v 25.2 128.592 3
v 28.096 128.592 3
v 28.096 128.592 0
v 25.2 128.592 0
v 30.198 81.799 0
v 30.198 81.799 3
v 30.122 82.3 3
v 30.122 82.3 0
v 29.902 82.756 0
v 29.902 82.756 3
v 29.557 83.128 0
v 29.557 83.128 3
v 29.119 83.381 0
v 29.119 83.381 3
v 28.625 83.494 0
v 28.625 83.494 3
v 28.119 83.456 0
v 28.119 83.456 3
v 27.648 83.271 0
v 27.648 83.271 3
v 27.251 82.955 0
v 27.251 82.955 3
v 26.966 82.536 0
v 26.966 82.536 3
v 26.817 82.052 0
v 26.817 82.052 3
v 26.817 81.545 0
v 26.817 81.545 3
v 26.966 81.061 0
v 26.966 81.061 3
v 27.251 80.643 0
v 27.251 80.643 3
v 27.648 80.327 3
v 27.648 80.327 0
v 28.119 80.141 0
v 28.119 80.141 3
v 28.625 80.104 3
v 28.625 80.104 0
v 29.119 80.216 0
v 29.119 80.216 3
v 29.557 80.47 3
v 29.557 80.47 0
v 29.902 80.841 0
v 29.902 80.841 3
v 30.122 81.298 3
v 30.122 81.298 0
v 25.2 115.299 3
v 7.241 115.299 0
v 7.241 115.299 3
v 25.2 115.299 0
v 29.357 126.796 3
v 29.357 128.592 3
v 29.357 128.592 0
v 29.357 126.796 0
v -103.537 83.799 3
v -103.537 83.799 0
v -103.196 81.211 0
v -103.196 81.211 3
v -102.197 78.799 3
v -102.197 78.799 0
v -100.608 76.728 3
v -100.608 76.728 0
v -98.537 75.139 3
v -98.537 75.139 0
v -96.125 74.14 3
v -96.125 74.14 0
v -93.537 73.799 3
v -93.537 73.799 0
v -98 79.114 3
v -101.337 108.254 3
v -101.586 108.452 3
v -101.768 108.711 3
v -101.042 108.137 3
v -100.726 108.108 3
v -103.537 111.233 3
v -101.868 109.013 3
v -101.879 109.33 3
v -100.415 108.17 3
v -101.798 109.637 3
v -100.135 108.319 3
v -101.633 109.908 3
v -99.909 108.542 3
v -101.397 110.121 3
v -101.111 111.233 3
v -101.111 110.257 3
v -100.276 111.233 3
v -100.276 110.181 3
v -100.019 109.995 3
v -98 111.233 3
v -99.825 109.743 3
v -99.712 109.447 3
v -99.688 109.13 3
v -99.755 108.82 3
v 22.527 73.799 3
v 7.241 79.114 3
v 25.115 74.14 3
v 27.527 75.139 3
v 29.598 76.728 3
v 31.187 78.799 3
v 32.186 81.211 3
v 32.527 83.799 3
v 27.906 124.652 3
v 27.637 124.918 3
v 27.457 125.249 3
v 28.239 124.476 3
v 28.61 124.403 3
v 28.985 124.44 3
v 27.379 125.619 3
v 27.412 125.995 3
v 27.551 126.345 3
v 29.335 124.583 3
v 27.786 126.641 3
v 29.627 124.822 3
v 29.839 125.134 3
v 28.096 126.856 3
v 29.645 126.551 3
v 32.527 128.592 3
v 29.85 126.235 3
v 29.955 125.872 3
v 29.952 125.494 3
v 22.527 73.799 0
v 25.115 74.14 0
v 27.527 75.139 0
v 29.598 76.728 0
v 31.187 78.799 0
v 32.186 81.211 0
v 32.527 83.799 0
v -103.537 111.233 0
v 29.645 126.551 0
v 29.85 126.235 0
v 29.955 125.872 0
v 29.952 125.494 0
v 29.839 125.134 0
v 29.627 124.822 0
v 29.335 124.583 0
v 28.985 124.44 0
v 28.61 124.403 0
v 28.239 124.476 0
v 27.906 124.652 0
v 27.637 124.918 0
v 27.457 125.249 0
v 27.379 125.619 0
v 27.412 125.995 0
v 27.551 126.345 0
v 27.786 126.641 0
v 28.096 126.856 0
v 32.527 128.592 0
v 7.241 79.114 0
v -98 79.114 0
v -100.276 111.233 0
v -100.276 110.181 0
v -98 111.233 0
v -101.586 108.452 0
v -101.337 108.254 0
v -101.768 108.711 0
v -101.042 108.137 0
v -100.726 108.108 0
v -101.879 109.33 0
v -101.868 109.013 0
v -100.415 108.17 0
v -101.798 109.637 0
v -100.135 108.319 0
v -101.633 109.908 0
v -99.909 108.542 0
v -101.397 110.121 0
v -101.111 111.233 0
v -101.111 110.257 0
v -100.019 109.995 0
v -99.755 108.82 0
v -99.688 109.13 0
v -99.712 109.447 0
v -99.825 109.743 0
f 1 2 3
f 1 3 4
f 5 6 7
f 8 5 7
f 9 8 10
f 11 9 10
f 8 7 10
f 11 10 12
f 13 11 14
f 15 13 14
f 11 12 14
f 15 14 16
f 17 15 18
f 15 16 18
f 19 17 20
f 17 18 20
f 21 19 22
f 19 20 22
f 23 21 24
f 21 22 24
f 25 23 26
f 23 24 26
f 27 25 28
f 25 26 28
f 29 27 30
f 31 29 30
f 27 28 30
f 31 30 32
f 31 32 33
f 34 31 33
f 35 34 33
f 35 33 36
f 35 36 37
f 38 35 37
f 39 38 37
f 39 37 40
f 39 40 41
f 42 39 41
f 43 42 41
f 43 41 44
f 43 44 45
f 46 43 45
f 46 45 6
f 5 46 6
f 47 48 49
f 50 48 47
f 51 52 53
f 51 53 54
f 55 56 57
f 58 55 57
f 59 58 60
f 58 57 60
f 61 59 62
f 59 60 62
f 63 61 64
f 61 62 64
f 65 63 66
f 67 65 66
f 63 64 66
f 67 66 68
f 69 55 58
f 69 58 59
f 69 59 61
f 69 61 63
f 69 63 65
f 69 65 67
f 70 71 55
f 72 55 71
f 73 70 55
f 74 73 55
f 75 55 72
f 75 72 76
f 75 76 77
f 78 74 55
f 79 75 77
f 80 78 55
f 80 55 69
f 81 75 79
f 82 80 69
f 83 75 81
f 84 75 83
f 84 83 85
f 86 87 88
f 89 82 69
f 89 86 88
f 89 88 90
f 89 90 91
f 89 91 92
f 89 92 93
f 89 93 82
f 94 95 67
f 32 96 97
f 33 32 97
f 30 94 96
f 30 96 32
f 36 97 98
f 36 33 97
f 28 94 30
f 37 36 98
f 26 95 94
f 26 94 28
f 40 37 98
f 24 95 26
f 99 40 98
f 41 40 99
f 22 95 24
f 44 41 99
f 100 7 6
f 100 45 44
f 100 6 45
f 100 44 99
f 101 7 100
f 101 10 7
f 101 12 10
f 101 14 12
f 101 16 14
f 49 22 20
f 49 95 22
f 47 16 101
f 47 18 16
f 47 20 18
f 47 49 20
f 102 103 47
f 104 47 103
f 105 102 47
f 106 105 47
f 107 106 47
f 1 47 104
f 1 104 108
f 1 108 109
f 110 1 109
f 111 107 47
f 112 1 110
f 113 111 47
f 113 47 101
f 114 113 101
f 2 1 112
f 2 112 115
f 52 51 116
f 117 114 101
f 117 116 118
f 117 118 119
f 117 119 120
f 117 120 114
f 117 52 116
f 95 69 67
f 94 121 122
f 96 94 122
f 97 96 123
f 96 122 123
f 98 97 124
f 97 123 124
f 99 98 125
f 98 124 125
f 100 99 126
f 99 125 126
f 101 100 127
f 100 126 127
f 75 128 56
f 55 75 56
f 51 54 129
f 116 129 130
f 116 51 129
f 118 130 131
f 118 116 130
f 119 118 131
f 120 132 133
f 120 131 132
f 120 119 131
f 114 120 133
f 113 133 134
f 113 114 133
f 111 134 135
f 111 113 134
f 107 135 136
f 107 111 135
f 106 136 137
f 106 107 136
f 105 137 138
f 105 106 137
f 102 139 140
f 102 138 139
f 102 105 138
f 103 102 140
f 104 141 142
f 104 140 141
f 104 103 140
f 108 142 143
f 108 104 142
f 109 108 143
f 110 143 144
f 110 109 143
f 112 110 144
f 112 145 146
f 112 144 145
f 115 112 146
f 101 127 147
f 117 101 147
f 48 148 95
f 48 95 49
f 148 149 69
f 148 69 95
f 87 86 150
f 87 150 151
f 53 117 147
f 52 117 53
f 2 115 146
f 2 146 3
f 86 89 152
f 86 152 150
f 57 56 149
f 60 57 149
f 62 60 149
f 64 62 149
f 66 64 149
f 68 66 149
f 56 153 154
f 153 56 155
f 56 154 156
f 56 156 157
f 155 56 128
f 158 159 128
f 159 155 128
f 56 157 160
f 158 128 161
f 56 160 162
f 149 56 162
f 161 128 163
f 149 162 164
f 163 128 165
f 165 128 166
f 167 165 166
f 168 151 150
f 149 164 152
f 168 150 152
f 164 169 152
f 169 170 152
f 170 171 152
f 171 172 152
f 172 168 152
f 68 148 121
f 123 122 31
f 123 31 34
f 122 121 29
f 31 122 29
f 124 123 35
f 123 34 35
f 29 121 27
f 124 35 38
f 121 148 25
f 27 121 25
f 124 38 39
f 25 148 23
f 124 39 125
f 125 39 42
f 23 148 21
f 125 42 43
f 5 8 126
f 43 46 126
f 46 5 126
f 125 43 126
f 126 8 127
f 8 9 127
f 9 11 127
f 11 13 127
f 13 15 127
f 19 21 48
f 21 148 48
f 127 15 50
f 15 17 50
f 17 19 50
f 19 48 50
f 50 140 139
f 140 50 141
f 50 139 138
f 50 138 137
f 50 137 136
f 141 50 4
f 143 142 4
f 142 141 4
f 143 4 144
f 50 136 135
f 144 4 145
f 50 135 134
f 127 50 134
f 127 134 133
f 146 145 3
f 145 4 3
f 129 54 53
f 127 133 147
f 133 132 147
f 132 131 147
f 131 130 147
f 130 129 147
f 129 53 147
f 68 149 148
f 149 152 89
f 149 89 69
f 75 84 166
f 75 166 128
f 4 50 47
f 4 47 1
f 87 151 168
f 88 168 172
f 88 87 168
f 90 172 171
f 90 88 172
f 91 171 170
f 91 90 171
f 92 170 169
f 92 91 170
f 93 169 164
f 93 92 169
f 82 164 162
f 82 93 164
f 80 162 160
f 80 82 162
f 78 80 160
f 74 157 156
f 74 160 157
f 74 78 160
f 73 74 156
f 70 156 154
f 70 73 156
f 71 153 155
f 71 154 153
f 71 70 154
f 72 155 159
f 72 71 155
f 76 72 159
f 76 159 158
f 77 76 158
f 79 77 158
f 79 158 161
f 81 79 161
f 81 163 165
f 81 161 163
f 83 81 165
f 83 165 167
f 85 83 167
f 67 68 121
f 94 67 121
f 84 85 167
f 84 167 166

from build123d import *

# Parameters (mm, degrees)
BOSS_EXTRUDE1_DEPTH  = 3
M3_CLEARANCE_HOLE1_D = 3.4
CUT_EXTRUDE1_DEPTH   = 10


with BuildPart() as part:
    # Sketch1 → Boss-Extrude1 (new body)
    with BuildSketch(Plane.XY):
        with BuildLine():
            Line((-93.536600288, 73.798841742), (22.52665856, 73.798841742))
            ThreePointArc((22.52665856, 73.798841742), (29.597726372, 76.72777393), (32.52665856, 83.798841742))
            Line((32.52665856, 83.798841742), (32.52665856, 133.798841742))
            ThreePointArc((32.52665856, 133.798841742), (29.597726372, 140.869909554), (22.52665856, 143.798841742))
            Line((22.52665856, 143.798841742), (-93.536600288, 143.798841742))
            ThreePointArc((-93.536600288, 143.798841742), (-100.6076681, 140.869909554), (-103.536600288, 133.798841742))
            Line((-103.536600288, 133.798841742), (-103.536600288, 83.798841742))
            ThreePointArc((-103.536600288, 83.798841742), (-100.6076681, 76.72777393), (-93.536600288, 73.798841742))
        make_face()
        Polygon((7.241251279, 79.113754803), (7.241251279, 115.298841742), (25.200464445, 115.298841742), (25.200464445, 141.298841742), (-63.686125174, 141.298841742), (-63.686125174, 139.298841742), (-98, 139.298841742), (-98, 79.113754803), align=None, mode=Mode.SUBTRACT)
    extrude(amount=BOSS_EXTRUDE1_DEPTH)

    # M3 Clearance Hole1 (through all)
    with Locations(Plane(origin=(0, 0, 0), x_dir=(-1, 0, 0), z_dir=(0, 0, -1))):
        with Locations((-28.497536526, 136.798841742), (-28.497536526, 81.798841742)):
            Hole(M3_CLEARANCE_HOLE1_D / 2)

    # Sketch2 → Cut-Extrude1 (cut)
    with BuildSketch(Plane.XY.offset(3)):
        with BuildLine():
            Line((-98, 111.232980273), (-100.276015927, 111.232980273))
            Line((-100.276015927, 111.232980273), (-100.276015927, 110.181279495))
            ThreePointArc((-100.276015927, 110.181279495), (-100.885260547, 108.11074669), (-101.110575194, 110.257259772))
            Line((-101.110575194, 110.257259772), (-101.110575194, 111.232980273))
            Line((-101.110575194, 111.232980273), (-103.536600288, 111.232980273))
            Line((-103.536600288, 111.232980273), (-103.536600288, 155.169137996))
            Line((-103.536600288, 155.169137996), (37.520914888, 146.495442913))
            Line((37.520914888, 146.495442913), (36.419995989, 128.591552724))
            Line((36.419995989, 128.591552724), (32.52665856, 128.591552724))
            Line((32.52665856, 128.591552724), (29.357018022, 128.591552724))
            Line((29.357018022, 128.591552724), (29.357018022, 126.79555932))
            ThreePointArc((29.357018022, 126.79555932), (28.609769319, 124.402587901), (28.09640217, 126.856390462))
            Line((28.09640217, 126.856390462), (28.09640217, 128.591552724))
            Line((28.09640217, 128.591552724), (25.200464445, 128.591552724))
            Line((25.200464445, 128.591552724), (-98, 111.232980273))
        make_face()
    extrude(amount=-CUT_EXTRUDE1_DEPTH, mode=Mode.SUBTRACT)


solid = part.part
